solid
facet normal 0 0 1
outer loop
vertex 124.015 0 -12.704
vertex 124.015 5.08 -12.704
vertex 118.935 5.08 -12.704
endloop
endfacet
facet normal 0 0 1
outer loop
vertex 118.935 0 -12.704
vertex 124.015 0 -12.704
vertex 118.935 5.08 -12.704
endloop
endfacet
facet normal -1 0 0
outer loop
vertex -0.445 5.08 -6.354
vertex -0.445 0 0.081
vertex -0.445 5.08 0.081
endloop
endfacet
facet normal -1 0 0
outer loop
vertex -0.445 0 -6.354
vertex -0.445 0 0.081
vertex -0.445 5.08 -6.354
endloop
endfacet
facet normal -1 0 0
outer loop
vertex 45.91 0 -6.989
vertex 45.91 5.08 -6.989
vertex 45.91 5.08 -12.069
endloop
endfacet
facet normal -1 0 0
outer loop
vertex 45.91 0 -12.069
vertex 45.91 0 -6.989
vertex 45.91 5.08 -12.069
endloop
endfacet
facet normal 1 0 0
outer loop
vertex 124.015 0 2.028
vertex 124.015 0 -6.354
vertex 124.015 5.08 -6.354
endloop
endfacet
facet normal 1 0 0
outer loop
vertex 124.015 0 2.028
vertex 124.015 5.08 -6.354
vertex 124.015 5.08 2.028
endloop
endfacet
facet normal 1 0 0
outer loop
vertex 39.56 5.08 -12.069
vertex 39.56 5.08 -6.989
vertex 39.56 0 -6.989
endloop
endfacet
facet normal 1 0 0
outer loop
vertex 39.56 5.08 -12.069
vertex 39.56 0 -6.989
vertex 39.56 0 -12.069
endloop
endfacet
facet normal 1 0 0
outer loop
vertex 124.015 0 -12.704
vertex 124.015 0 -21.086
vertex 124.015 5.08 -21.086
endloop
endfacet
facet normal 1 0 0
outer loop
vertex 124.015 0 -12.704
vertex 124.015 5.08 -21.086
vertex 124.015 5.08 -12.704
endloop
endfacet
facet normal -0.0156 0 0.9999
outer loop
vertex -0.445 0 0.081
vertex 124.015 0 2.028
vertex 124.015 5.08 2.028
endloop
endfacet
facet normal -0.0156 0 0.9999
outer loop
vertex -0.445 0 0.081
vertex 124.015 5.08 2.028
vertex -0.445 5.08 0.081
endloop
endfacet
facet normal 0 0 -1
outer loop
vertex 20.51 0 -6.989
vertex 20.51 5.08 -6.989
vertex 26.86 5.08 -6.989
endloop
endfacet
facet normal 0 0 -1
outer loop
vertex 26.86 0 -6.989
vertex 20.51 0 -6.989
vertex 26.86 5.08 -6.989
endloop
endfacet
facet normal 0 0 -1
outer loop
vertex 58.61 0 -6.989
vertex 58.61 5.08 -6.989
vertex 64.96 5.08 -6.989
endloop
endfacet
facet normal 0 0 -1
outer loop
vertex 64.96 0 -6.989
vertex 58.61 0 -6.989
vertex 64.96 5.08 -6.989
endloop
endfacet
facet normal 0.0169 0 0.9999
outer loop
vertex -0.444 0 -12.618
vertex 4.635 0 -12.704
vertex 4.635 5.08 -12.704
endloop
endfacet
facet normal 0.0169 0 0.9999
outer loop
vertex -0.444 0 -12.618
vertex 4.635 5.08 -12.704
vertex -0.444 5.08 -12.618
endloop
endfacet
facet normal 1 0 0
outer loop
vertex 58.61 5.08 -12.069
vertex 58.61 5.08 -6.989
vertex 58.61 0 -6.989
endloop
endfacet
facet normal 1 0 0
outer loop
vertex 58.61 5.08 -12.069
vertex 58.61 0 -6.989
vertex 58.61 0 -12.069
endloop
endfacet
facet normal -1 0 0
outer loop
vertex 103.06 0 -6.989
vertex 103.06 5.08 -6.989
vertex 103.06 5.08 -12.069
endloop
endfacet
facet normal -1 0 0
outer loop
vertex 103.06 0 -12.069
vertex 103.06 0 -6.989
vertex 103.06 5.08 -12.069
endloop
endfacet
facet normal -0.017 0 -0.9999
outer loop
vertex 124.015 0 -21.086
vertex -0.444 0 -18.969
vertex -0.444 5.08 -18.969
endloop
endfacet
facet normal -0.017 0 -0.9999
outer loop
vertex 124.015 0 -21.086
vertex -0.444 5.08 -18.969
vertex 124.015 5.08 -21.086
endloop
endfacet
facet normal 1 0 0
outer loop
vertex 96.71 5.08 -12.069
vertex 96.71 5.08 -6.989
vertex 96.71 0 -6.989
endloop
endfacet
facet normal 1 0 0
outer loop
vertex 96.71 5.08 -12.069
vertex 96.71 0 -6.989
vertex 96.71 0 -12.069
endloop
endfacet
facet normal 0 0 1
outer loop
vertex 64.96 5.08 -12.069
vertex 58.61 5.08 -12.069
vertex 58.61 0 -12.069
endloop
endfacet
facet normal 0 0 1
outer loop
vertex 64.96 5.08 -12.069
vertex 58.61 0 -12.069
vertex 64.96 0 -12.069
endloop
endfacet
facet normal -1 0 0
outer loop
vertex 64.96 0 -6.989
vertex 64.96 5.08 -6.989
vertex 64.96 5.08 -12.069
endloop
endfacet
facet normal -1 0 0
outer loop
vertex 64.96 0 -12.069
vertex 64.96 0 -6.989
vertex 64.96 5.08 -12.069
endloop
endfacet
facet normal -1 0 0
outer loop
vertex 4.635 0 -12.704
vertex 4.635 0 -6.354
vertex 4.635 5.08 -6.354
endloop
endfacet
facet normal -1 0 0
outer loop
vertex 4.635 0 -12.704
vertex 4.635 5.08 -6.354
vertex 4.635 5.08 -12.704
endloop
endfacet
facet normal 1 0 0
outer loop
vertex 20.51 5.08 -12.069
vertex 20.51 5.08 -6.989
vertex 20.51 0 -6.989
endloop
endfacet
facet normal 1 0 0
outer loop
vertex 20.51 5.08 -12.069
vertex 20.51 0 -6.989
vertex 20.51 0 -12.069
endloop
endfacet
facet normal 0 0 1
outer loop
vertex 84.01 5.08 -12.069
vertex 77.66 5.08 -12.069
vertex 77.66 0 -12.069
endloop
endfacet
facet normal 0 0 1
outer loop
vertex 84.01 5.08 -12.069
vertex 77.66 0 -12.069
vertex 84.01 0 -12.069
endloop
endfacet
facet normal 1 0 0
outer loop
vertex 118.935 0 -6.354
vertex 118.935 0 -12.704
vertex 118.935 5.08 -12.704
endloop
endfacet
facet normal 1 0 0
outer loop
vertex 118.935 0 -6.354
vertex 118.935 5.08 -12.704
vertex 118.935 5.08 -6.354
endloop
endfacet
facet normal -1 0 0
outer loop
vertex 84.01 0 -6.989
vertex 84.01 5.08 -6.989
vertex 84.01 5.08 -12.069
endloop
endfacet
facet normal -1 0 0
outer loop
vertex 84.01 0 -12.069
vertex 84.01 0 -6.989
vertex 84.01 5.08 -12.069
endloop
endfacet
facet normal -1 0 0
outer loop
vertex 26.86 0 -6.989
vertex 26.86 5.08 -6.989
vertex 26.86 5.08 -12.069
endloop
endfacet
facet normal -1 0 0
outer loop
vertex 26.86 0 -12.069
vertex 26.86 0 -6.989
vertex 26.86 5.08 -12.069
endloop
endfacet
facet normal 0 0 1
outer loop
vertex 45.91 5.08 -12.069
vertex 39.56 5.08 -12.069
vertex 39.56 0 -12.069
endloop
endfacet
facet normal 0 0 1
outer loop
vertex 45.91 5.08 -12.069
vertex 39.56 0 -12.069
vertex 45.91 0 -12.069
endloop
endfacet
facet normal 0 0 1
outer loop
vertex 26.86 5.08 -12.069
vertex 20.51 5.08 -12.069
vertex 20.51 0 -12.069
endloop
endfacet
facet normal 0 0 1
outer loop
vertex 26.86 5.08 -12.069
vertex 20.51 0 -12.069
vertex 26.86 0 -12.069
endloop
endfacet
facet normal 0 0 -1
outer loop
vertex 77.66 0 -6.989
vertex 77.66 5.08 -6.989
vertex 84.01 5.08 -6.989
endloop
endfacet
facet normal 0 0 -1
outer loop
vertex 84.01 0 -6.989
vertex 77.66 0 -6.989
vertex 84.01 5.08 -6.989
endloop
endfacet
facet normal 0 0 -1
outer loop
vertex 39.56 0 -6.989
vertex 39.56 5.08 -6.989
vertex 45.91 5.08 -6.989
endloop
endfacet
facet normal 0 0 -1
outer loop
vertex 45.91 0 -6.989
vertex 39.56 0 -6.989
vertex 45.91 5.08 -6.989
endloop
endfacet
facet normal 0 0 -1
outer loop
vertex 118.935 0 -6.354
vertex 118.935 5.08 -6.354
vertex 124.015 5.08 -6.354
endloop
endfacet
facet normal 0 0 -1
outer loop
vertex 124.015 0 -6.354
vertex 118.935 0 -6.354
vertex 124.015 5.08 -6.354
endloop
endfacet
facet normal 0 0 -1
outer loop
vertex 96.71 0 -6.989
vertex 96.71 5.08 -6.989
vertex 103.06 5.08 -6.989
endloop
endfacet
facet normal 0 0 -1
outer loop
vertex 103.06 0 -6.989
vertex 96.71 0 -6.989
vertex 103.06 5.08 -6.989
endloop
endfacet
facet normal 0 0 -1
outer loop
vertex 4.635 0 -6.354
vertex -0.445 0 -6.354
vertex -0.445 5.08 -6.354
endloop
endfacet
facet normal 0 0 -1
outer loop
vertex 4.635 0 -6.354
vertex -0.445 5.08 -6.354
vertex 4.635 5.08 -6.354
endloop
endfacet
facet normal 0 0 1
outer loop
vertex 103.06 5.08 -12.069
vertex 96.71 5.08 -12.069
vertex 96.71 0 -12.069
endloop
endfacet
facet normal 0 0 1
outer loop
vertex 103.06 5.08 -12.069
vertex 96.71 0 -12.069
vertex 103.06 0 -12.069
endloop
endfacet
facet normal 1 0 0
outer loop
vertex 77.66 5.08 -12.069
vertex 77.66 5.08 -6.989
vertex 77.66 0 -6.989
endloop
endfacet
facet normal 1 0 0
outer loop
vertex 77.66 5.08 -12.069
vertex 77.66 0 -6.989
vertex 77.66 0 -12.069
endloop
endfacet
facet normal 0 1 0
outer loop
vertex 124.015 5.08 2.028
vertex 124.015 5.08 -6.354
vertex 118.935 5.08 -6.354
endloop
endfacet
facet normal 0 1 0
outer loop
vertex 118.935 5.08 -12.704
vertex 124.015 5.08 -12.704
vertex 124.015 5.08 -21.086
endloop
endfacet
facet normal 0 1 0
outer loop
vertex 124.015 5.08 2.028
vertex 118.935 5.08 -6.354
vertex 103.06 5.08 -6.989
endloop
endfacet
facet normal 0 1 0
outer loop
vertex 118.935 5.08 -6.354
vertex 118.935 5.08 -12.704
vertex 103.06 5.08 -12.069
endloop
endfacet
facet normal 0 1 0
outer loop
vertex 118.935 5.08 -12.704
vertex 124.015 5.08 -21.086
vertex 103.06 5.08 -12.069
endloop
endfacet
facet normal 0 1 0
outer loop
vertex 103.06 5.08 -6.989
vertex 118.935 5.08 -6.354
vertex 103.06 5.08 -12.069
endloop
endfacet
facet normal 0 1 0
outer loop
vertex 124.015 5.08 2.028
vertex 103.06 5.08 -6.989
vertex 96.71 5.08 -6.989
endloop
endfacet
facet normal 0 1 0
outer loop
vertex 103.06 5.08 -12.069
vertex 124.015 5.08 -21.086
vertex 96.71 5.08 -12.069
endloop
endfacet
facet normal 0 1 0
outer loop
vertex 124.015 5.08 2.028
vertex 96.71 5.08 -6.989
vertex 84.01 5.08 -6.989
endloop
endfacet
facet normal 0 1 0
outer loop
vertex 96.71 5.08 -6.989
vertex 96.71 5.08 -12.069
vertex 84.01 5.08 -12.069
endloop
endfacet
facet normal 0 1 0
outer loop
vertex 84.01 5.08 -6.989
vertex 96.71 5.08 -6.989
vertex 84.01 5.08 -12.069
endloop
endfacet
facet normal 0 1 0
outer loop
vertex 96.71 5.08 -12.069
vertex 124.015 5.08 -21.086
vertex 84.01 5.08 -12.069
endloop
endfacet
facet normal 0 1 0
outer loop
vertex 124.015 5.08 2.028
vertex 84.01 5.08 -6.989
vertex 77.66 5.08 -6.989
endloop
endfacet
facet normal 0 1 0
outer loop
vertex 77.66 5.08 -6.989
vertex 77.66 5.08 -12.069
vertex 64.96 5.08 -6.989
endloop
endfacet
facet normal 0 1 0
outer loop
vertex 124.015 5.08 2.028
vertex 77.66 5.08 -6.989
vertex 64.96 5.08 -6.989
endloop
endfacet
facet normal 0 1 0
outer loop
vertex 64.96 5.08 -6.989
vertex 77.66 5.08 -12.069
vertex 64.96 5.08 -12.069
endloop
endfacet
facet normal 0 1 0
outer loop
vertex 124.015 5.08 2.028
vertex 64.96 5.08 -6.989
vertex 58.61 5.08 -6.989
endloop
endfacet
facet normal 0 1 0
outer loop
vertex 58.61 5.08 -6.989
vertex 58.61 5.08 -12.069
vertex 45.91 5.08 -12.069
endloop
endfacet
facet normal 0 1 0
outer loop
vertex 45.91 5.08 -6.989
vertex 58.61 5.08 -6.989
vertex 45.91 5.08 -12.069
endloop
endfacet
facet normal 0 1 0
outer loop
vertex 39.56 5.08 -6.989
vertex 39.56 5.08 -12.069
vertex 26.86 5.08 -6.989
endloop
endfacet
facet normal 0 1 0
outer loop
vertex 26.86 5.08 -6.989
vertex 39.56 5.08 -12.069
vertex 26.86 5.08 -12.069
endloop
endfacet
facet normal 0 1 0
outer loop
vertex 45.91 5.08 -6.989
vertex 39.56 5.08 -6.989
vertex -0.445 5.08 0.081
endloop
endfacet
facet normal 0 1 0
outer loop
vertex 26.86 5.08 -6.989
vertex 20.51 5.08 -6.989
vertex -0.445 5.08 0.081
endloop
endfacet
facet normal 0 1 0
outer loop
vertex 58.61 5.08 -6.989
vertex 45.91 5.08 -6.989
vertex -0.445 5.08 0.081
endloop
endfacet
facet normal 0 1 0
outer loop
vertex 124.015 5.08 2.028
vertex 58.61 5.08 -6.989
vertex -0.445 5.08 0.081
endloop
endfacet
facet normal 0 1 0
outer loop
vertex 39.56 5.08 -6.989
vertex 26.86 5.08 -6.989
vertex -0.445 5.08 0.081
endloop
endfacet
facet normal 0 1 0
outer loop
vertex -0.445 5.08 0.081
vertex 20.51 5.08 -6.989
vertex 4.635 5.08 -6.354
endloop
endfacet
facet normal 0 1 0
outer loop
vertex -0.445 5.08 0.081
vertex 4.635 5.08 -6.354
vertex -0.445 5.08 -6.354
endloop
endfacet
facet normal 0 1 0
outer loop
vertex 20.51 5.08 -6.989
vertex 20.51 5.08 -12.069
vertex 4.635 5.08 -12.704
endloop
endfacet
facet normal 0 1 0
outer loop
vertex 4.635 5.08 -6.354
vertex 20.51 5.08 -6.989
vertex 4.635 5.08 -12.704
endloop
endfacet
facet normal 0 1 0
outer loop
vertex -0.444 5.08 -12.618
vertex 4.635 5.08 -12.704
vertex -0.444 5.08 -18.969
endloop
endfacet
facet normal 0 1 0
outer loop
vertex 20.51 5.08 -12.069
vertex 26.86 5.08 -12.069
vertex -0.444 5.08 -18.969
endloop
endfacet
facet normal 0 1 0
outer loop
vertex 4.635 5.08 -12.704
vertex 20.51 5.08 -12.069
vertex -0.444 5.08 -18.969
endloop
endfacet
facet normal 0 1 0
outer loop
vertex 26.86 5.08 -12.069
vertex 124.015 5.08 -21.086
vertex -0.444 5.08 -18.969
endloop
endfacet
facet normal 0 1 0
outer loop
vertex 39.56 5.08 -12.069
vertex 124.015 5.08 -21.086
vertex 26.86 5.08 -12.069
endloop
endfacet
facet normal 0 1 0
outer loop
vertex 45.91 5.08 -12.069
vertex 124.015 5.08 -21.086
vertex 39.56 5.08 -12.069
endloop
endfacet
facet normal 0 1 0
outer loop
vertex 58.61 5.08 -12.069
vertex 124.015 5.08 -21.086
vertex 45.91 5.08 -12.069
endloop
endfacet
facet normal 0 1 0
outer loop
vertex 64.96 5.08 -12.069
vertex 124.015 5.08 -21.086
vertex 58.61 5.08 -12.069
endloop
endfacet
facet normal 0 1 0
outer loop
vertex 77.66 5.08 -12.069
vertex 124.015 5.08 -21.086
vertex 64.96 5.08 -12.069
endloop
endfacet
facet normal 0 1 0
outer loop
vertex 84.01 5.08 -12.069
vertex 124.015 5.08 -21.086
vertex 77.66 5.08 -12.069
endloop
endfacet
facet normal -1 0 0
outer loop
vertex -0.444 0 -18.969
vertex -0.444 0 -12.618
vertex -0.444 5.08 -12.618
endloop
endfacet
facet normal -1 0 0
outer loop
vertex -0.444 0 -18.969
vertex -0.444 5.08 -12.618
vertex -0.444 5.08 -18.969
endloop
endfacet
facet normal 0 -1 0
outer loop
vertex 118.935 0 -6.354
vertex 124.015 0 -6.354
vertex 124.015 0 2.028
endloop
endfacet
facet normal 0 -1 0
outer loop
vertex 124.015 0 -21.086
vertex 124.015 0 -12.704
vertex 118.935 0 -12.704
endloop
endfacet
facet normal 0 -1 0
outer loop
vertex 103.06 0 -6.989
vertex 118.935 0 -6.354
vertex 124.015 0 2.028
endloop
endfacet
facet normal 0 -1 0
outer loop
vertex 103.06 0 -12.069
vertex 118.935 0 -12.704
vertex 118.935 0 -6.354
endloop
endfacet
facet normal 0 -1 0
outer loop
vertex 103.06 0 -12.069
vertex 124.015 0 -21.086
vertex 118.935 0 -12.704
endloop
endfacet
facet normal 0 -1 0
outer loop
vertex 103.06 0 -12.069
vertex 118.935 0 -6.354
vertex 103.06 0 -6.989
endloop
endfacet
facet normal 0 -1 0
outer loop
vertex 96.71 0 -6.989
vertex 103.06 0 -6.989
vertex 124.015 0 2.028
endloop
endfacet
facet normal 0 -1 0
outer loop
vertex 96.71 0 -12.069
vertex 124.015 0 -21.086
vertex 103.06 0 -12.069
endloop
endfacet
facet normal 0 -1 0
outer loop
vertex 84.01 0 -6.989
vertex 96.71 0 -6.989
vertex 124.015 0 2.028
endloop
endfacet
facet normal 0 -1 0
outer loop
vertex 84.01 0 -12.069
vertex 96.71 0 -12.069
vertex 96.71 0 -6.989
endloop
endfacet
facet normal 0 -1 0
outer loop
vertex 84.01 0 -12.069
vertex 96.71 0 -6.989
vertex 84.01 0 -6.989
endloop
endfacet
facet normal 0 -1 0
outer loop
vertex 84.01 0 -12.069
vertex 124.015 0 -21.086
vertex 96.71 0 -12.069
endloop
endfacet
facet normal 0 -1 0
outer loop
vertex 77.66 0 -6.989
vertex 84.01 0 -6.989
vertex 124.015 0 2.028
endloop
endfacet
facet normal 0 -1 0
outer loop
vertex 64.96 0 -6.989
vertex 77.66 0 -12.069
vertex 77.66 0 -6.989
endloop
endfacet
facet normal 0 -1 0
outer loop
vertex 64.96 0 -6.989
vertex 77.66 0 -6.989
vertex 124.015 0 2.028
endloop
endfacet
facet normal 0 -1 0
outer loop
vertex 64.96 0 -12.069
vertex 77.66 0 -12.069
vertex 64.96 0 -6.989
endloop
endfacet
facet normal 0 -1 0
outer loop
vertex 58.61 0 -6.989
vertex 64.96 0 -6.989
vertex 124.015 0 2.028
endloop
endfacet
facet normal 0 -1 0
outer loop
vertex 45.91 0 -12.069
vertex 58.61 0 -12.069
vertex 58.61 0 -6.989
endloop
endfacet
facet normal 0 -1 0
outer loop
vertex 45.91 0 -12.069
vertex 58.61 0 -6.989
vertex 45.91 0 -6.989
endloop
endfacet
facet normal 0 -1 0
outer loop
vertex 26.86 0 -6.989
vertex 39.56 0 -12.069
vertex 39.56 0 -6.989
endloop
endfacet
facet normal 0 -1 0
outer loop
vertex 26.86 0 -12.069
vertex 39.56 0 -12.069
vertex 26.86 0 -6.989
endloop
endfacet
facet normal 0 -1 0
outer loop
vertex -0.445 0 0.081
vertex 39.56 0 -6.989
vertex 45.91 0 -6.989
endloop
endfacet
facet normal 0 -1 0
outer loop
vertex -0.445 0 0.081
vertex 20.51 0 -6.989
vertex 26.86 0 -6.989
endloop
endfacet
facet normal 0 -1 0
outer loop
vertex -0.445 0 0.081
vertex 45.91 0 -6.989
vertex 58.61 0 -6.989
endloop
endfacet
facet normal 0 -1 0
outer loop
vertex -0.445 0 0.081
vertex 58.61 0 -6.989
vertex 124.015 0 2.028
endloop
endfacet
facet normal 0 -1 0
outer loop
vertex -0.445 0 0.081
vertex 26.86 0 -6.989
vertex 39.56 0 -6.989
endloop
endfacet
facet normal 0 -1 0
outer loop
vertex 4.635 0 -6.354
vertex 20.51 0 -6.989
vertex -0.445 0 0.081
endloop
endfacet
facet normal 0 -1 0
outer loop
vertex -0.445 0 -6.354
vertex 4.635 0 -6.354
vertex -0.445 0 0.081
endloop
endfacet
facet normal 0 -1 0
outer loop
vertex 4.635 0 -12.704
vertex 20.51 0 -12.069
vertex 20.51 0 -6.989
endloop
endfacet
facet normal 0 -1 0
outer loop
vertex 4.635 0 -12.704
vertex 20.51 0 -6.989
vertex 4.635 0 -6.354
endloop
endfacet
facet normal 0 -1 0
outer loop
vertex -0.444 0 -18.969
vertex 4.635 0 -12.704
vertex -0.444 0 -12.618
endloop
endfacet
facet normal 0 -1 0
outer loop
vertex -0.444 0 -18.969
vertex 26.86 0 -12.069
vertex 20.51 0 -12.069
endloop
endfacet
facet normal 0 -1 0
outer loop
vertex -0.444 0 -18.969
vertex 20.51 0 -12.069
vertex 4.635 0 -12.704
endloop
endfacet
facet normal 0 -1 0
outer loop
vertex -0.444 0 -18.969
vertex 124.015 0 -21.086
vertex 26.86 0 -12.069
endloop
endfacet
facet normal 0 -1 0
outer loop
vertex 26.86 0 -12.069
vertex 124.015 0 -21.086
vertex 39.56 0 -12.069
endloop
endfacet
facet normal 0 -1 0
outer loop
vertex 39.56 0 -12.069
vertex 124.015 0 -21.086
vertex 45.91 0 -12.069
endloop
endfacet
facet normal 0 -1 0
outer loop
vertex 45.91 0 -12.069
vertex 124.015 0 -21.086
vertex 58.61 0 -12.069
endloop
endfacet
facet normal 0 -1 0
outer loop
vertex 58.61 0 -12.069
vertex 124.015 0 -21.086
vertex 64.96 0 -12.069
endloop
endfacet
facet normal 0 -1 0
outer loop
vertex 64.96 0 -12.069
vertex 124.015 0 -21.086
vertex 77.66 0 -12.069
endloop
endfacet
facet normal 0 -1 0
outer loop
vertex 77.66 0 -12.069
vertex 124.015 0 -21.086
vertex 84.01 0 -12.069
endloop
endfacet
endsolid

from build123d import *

# Parameters (mm, degrees)
BOSS_EXTRUDE1_DEPTH = 5.08
SKETCH2_W           = 6.35
SKETCH2_H           = 5.08
CUT_EXTRUDE1_DEPTH  = 6.08
LPATTERN1_COUNT     = 5
LPATTERN1_PITCH     = 19.05


with BuildPart() as part:
    # Sketch1 → Boss-Extrude1 (new body)
    with BuildSketch(Plane(origin=(0, 0, 0), x_dir=(1, 0, 0), z_dir=(0, 1, 0))):
        Polygon((-0.444494962, 12.618026496), (-0.444494962, 18.96894547), (124.014769965, 21.086442969), (124.014769965, 12.704442969), (118.934769965, 12.704442969), (118.934769965, 6.354442969), (124.014769965, 6.354442969), (124.014769965, -2.027557031), (-0.445230035, -0.081054515), (-0.445230035, 6.354442969), (4.634769965, 6.354442969), (4.634769965, 12.704442969), align=None)
    extrude(amount=BOSS_EXTRUDE1_DEPTH)

    # Sketch2 → Cut-Extrude1 (cut, through all)
    with BuildSketch(Plane(origin=(0, 5.08, 0), x_dir=(1, 0, 0), z_dir=(0, 1, 0))):
        with Locations((23.684769965, 9.529442969)):
            Rectangle(SKETCH2_W, SKETCH2_H)
    cut_extrude1 = extrude(amount=-CUT_EXTRUDE1_DEPTH, mode=Mode.SUBTRACT)

    # LPattern1: Cut-Extrude1 ×5
    with Locations(*[(i * LPATTERN1_PITCH, 0, 0) for i in range(1, LPATTERN1_COUNT)]):
        add(cut_extrude1, mode=Mode.SUBTRACT)


solid = part.part
